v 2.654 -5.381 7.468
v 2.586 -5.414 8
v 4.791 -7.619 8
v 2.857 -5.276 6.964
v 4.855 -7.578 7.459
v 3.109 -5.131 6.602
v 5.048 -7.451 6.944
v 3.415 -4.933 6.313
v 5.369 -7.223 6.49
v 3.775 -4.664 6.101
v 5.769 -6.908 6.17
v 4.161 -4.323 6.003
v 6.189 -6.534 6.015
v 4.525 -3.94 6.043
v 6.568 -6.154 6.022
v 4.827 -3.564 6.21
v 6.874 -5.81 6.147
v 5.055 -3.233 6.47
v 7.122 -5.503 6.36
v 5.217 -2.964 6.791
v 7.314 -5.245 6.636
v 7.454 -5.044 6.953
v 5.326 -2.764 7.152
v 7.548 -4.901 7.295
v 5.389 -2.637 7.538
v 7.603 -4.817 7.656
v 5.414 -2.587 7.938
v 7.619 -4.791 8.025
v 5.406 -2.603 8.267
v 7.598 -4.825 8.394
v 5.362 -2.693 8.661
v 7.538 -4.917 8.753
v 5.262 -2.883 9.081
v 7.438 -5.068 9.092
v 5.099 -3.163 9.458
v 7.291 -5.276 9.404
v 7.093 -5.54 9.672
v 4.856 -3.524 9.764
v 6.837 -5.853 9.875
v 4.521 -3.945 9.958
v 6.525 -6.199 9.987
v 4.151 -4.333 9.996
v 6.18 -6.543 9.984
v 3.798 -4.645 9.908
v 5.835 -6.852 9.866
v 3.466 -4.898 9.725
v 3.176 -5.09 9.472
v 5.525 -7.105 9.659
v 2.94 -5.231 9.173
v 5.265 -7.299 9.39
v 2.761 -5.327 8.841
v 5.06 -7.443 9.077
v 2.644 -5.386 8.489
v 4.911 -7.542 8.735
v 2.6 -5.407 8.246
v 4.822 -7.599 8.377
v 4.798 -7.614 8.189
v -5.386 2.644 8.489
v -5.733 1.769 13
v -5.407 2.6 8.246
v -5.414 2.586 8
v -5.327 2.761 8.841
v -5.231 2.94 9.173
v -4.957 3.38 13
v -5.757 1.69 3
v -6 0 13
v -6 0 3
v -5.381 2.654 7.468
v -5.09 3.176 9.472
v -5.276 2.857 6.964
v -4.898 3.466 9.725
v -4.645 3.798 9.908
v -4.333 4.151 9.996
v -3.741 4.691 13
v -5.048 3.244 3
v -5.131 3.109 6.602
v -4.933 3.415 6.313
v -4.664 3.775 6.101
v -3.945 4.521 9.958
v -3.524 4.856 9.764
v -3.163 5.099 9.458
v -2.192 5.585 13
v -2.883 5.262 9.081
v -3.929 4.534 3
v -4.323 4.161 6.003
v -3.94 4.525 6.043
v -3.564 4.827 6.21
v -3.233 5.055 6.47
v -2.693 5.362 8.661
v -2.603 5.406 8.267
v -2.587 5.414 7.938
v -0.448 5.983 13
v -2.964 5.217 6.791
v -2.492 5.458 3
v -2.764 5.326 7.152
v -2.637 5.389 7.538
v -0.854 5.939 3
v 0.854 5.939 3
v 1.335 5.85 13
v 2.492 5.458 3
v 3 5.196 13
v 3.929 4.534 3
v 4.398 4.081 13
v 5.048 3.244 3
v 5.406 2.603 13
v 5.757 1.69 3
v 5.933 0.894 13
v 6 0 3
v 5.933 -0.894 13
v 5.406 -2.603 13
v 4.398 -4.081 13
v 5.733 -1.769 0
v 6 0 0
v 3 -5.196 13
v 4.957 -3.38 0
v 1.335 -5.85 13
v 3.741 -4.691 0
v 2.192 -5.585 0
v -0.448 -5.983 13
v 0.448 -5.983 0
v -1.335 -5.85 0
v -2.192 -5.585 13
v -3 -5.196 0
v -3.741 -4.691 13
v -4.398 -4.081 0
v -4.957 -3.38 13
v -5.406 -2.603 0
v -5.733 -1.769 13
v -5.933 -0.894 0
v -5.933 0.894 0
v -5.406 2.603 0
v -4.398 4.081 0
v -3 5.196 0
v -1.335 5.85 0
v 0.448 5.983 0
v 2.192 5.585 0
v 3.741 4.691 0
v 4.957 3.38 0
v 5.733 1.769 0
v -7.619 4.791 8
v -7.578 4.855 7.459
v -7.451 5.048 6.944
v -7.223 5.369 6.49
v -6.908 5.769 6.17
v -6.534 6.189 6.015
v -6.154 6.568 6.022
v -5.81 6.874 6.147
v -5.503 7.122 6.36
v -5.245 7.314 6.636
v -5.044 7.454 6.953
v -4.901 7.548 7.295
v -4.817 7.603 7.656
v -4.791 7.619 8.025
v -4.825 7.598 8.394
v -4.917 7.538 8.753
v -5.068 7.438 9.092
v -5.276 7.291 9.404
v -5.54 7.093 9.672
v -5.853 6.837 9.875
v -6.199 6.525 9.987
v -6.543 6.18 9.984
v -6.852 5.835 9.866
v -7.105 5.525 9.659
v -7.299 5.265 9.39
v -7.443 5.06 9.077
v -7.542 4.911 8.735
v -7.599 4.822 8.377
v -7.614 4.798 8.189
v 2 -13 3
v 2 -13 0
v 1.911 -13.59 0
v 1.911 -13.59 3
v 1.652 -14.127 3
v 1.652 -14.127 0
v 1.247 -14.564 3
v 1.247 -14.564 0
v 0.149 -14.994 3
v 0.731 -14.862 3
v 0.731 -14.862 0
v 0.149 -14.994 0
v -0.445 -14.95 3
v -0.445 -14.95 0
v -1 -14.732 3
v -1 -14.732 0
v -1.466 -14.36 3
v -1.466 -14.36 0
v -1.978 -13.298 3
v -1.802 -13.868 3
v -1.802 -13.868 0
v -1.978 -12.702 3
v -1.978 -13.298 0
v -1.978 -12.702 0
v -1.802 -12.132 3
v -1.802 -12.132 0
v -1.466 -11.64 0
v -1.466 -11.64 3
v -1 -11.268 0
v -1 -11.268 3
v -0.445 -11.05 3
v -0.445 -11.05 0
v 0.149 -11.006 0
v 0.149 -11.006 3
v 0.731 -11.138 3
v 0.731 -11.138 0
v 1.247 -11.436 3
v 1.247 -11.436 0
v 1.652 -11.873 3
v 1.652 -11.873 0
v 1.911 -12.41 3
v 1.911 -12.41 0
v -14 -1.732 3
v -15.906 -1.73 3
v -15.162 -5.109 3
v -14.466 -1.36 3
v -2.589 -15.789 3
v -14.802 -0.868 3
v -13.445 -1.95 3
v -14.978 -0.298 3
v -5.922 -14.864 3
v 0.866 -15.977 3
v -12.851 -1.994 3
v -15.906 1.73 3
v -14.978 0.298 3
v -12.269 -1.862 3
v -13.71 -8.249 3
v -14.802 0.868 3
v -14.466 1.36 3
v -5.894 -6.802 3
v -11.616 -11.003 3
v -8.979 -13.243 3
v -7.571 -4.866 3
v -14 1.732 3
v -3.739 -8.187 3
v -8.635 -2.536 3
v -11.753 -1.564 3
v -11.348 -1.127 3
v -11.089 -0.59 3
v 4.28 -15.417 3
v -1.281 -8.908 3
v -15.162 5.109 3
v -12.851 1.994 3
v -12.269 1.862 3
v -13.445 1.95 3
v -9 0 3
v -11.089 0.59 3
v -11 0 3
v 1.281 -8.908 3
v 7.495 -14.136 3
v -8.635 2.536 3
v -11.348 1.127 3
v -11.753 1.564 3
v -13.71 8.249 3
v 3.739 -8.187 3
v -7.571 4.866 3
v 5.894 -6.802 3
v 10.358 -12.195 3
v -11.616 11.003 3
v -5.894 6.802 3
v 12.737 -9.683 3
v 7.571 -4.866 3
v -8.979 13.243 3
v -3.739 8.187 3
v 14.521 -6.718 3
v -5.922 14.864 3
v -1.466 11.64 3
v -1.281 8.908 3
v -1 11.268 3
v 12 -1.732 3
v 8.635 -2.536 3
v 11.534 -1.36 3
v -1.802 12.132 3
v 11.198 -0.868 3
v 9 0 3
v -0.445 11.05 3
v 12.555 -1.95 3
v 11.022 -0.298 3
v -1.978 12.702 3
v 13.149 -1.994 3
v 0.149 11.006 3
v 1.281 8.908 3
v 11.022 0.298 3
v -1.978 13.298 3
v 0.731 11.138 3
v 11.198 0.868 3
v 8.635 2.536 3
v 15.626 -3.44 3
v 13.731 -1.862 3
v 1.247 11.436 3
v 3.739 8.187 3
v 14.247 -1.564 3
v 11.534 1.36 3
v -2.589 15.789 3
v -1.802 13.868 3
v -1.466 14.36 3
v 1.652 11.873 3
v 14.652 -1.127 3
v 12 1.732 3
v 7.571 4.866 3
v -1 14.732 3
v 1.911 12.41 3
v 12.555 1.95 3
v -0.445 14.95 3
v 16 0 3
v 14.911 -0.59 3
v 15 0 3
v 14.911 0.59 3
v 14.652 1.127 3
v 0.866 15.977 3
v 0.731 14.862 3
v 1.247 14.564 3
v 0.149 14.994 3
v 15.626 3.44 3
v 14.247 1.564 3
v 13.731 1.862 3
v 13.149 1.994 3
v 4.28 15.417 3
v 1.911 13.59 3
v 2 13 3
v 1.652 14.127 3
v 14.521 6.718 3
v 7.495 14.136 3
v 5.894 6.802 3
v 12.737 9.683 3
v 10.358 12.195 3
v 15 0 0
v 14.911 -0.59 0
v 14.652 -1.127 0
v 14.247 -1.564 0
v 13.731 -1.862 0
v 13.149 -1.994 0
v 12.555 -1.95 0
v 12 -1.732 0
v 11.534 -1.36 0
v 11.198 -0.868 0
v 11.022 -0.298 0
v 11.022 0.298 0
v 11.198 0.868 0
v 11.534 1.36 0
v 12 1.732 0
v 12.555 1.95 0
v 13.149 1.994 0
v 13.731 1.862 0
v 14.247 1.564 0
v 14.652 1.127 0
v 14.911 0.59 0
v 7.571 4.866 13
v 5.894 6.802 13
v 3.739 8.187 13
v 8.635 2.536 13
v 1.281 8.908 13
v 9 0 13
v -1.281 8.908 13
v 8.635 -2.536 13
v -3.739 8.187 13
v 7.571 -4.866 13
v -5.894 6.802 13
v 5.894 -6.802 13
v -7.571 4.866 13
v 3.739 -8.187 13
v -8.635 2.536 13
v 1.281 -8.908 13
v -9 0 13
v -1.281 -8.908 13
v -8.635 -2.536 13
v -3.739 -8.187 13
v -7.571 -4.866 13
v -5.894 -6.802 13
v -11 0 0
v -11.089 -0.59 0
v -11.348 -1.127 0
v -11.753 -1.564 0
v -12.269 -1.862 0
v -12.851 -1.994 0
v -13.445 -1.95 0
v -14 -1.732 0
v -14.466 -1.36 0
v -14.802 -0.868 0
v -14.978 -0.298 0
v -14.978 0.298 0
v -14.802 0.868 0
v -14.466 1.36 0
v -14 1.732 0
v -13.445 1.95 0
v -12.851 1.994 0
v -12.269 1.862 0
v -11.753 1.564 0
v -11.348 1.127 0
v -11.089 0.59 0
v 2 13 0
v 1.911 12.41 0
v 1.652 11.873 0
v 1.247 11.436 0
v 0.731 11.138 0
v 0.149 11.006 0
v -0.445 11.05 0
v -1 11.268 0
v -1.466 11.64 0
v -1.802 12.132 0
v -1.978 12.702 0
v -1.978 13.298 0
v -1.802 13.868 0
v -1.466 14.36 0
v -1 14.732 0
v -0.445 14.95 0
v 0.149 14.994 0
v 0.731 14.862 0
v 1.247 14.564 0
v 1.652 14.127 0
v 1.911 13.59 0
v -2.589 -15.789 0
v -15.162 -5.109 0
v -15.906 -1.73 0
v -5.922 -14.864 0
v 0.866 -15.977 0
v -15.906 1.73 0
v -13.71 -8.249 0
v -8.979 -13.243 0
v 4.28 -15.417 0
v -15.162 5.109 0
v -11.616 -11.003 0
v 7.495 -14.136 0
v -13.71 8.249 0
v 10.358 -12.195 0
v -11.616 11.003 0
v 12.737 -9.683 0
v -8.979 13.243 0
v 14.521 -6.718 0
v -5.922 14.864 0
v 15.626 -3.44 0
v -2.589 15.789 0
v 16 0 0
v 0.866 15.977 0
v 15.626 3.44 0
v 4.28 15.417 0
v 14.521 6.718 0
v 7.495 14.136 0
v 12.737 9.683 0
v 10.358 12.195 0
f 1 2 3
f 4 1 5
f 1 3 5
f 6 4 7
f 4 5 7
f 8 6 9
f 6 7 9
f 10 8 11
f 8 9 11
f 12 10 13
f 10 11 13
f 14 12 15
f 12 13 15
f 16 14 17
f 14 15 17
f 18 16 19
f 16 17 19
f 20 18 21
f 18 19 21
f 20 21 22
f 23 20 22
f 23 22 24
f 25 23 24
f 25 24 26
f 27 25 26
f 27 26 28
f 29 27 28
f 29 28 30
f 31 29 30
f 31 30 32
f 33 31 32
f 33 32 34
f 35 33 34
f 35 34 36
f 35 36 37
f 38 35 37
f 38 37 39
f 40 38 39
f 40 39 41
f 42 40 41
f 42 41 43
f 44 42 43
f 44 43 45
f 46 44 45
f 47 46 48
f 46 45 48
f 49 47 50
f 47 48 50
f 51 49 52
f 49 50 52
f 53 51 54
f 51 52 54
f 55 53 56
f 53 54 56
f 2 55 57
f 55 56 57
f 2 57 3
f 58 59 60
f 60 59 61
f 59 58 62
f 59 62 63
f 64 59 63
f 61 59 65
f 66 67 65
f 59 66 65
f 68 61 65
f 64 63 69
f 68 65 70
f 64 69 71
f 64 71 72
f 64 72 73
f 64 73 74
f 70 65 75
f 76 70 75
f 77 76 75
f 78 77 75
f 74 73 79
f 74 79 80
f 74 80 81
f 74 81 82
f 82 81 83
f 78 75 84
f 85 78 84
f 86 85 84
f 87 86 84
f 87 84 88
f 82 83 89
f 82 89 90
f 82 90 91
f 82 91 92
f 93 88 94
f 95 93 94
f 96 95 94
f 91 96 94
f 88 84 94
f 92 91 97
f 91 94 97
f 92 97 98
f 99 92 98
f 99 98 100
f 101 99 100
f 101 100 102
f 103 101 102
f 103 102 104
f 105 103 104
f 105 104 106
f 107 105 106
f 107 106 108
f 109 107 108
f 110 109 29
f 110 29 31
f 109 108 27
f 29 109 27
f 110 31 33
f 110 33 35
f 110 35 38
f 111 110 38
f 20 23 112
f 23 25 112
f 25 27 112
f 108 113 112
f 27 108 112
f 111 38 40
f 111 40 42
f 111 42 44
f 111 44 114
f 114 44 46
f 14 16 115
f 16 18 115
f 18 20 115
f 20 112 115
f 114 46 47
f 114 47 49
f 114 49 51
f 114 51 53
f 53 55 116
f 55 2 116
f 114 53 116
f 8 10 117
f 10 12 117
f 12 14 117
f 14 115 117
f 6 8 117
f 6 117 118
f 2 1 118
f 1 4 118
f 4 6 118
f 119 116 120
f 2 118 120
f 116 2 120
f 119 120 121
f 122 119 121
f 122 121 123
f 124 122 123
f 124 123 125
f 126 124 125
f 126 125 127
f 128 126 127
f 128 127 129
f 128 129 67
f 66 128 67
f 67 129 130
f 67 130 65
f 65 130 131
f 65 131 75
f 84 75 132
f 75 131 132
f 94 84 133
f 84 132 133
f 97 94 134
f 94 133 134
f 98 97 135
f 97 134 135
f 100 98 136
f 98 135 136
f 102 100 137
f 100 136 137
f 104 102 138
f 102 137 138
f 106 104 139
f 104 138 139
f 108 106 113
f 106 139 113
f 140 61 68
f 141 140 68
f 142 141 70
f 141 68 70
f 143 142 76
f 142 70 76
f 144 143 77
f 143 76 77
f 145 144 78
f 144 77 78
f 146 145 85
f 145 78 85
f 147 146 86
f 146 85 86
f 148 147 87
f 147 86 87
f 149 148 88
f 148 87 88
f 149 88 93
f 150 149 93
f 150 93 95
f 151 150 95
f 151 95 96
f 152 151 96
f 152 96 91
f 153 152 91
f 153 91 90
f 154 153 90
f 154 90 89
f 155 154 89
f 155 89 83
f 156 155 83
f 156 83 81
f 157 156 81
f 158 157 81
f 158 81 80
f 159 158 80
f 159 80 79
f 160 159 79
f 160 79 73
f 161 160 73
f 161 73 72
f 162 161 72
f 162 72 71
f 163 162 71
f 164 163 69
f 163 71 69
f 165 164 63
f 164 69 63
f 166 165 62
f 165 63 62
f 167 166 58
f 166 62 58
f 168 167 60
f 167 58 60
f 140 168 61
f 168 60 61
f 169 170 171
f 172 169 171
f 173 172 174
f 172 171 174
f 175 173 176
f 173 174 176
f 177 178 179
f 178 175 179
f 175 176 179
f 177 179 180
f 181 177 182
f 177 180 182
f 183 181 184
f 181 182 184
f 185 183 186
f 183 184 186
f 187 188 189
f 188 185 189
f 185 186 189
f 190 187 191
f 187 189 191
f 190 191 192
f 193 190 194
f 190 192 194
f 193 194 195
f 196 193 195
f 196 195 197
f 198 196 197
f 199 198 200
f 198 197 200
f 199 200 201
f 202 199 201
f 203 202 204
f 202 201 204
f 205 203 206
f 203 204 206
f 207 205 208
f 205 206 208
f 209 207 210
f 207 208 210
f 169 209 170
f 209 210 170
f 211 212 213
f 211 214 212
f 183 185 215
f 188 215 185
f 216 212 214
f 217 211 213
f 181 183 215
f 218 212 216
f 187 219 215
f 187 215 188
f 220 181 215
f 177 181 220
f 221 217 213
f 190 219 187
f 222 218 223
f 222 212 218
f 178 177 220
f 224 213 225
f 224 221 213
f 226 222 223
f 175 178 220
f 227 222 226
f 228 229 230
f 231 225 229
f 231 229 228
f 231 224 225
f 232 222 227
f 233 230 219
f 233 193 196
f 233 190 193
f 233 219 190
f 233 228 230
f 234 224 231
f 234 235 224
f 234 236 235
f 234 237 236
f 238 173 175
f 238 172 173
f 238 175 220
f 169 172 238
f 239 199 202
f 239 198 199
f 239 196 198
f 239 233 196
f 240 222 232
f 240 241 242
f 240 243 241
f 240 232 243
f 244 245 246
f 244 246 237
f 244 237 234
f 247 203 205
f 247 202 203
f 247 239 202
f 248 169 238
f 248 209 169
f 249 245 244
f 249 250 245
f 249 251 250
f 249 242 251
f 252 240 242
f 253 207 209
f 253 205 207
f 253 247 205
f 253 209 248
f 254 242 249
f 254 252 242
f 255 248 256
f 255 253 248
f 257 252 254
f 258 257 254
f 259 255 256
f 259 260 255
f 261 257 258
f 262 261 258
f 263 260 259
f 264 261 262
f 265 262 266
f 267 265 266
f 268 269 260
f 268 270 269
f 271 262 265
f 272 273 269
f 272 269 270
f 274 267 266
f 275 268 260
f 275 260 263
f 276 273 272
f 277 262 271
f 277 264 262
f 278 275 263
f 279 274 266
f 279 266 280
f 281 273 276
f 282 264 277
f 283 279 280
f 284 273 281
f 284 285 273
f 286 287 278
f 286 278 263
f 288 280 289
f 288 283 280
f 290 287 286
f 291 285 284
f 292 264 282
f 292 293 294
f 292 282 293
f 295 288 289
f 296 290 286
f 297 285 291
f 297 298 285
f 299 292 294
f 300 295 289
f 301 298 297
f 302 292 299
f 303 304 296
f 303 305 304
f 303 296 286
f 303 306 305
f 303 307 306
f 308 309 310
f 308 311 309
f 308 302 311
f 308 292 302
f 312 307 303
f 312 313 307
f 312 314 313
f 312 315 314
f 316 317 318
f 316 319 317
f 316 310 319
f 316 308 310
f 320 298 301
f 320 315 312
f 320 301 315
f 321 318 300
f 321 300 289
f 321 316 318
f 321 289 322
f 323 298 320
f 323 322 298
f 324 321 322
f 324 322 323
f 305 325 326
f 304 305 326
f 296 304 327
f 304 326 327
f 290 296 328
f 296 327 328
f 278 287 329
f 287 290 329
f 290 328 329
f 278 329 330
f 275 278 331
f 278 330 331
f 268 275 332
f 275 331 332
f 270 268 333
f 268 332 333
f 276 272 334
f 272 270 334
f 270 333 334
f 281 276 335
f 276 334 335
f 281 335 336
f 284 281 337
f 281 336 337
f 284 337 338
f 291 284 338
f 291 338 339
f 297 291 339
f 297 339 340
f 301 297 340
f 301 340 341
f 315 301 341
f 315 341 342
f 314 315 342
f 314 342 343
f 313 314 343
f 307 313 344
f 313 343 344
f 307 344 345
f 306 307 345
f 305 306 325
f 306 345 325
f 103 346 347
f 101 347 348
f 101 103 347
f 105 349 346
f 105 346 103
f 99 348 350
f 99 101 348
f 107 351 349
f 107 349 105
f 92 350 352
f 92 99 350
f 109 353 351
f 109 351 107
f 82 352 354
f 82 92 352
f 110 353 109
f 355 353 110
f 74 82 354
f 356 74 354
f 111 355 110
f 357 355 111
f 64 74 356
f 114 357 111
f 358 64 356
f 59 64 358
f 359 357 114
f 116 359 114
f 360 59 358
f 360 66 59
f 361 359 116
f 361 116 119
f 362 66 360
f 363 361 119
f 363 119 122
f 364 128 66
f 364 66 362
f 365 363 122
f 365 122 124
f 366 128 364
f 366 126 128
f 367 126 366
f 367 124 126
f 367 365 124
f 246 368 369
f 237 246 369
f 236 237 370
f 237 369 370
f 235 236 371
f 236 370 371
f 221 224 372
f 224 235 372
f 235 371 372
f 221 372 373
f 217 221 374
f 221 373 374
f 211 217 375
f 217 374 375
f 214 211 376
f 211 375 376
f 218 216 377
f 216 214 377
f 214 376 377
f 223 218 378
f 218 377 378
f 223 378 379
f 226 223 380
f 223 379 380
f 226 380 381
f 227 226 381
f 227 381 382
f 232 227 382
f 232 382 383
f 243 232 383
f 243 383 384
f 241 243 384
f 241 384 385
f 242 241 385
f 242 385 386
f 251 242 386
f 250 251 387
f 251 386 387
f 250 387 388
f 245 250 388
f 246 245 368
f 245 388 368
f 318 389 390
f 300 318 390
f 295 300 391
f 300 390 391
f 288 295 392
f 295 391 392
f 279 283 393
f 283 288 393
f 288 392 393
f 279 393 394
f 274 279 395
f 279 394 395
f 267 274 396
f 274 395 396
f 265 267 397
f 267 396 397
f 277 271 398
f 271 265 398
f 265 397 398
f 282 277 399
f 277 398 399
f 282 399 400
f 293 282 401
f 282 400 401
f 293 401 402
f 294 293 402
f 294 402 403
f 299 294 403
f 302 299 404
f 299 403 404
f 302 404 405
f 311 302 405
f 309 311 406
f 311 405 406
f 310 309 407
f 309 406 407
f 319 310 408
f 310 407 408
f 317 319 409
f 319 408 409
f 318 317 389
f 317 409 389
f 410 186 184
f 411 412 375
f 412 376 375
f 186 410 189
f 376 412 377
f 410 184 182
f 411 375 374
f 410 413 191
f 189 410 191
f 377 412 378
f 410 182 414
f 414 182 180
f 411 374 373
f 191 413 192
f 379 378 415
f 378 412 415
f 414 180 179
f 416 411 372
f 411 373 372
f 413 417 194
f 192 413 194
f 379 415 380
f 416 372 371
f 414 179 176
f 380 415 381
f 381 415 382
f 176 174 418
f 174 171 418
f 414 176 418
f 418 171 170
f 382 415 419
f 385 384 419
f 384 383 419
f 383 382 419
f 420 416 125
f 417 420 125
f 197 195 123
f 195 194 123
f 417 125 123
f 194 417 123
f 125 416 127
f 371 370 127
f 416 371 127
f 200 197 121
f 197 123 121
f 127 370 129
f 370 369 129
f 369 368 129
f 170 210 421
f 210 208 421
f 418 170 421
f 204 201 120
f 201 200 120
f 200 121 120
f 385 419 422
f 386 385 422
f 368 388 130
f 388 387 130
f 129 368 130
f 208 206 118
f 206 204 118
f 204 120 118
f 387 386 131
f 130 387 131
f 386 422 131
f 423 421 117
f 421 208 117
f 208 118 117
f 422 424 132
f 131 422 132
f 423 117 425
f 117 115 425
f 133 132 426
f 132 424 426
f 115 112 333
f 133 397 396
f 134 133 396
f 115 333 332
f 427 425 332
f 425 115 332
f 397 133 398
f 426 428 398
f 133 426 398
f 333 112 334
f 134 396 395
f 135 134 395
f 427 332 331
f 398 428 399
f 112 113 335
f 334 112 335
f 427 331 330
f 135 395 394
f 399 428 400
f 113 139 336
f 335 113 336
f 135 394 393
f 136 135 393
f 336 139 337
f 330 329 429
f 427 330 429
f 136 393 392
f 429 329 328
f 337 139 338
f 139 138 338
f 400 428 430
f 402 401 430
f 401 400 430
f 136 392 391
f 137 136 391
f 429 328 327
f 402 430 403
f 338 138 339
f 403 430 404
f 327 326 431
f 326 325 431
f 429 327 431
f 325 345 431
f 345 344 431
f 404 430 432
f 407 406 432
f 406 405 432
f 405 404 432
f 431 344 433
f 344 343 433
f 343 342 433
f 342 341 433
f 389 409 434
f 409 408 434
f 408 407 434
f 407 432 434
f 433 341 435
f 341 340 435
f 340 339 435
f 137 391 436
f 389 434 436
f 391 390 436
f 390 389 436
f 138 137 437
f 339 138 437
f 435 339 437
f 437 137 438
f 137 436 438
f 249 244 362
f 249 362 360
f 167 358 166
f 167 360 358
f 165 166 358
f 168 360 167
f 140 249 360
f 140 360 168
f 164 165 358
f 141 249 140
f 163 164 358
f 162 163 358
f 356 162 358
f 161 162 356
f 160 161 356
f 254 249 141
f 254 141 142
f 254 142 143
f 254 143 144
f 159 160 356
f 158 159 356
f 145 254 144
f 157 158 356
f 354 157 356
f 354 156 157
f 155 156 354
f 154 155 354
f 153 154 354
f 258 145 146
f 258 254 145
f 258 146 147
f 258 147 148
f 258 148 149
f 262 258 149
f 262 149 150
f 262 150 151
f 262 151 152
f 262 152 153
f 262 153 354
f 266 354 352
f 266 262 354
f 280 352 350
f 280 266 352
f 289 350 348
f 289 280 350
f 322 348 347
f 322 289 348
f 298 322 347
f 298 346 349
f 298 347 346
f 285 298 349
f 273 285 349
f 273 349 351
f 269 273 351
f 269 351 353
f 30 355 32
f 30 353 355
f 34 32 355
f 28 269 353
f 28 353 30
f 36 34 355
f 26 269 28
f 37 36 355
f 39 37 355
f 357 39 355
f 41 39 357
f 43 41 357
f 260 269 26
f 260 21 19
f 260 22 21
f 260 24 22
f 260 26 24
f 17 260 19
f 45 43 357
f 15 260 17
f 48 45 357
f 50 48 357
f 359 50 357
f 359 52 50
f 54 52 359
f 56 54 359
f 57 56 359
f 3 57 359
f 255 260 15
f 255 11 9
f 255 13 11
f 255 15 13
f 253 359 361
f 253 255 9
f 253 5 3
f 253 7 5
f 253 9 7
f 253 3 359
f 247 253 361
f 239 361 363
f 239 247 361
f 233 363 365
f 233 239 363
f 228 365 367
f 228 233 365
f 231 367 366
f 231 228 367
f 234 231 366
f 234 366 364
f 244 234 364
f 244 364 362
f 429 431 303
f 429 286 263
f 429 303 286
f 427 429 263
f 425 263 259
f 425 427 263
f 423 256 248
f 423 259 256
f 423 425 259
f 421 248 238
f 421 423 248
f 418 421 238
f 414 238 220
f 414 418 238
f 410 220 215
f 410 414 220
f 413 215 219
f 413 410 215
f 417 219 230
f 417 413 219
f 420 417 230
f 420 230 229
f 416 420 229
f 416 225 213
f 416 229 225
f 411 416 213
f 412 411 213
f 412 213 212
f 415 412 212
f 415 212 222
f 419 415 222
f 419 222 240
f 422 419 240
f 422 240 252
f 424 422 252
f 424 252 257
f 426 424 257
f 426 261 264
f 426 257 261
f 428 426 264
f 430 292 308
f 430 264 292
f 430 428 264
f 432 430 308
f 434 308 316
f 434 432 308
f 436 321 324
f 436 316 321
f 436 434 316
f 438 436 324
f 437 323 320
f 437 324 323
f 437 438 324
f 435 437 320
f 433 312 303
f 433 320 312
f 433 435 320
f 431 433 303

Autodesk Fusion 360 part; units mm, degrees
sketch "Sketch1" plane through (0, 0, 0) normal (0, 0, 1) x (1, 0, 0)
  circle A0 centre (0, 0) radius 16
  circle A1 centre (0, 0) radius 13 construction
  line L0 (0, 0) -> (0, 16) construction
  circle A2 centre (0, 13) radius 2
  circle A3 centre (-13, 0) radius 2
  circle A4 centre (0, -13) radius 2
  circle A5 centre (13, 0) radius 2
  circle A6 centre (0, 0) radius 6
  dimension "d1" = 32
  dimension "d2" = 26
  dimension "d3" = 4
  dimension "d5" = 360
  dimension "d6" = 12
extrude "Extrude1" add sketch "Sketch1" along normal blind 3
sketch "Sketch2" plane through (0, 0, 3) normal (0, 0, 1) x (-1, 0, 0)
  circle A0 centre (0, -13) radius 2
  circle A1 centre (13, 0) radius 2
  circle A2 centre (0, 13) radius 2
  circle A3 centre (-13, 0) radius 2
  circle A4 centre (0, 0) radius 6
  circle A5 centre (0, 0) radius 16
  circle A6 centre (0, 0) radius 9
  dimension "d9" = 18
extrude "Extrude2" add sketch "Sketch2" along normal blind 10 contours A6
ref_plane "WorkPlane1" through (6.364, -6.364, 9.993) normal (0.7071, -0.7071, 0) x (-0.7071, -0.7071, 0)
sketch "Sketch3" plane through (6.364, -6.364, 0) normal (0.7071, -0.7071, 0) x (-0.7071, -0.7071, 0)
  line L0 (-9, -13) -> (9, -13) construction
  line L1 (9, -3) -> (-9, -3) construction
  line L2 (0, -13) -> (0, -3) construction
  circle A0 centre (0, -8) radius 2
  line L3 (0, -8) -> (0, -10) construction
  dimension "d13" = 4
  dimension "d14" = 3
extrude "Extrude3" cut sketch "Sketch3" against normal blind 20
